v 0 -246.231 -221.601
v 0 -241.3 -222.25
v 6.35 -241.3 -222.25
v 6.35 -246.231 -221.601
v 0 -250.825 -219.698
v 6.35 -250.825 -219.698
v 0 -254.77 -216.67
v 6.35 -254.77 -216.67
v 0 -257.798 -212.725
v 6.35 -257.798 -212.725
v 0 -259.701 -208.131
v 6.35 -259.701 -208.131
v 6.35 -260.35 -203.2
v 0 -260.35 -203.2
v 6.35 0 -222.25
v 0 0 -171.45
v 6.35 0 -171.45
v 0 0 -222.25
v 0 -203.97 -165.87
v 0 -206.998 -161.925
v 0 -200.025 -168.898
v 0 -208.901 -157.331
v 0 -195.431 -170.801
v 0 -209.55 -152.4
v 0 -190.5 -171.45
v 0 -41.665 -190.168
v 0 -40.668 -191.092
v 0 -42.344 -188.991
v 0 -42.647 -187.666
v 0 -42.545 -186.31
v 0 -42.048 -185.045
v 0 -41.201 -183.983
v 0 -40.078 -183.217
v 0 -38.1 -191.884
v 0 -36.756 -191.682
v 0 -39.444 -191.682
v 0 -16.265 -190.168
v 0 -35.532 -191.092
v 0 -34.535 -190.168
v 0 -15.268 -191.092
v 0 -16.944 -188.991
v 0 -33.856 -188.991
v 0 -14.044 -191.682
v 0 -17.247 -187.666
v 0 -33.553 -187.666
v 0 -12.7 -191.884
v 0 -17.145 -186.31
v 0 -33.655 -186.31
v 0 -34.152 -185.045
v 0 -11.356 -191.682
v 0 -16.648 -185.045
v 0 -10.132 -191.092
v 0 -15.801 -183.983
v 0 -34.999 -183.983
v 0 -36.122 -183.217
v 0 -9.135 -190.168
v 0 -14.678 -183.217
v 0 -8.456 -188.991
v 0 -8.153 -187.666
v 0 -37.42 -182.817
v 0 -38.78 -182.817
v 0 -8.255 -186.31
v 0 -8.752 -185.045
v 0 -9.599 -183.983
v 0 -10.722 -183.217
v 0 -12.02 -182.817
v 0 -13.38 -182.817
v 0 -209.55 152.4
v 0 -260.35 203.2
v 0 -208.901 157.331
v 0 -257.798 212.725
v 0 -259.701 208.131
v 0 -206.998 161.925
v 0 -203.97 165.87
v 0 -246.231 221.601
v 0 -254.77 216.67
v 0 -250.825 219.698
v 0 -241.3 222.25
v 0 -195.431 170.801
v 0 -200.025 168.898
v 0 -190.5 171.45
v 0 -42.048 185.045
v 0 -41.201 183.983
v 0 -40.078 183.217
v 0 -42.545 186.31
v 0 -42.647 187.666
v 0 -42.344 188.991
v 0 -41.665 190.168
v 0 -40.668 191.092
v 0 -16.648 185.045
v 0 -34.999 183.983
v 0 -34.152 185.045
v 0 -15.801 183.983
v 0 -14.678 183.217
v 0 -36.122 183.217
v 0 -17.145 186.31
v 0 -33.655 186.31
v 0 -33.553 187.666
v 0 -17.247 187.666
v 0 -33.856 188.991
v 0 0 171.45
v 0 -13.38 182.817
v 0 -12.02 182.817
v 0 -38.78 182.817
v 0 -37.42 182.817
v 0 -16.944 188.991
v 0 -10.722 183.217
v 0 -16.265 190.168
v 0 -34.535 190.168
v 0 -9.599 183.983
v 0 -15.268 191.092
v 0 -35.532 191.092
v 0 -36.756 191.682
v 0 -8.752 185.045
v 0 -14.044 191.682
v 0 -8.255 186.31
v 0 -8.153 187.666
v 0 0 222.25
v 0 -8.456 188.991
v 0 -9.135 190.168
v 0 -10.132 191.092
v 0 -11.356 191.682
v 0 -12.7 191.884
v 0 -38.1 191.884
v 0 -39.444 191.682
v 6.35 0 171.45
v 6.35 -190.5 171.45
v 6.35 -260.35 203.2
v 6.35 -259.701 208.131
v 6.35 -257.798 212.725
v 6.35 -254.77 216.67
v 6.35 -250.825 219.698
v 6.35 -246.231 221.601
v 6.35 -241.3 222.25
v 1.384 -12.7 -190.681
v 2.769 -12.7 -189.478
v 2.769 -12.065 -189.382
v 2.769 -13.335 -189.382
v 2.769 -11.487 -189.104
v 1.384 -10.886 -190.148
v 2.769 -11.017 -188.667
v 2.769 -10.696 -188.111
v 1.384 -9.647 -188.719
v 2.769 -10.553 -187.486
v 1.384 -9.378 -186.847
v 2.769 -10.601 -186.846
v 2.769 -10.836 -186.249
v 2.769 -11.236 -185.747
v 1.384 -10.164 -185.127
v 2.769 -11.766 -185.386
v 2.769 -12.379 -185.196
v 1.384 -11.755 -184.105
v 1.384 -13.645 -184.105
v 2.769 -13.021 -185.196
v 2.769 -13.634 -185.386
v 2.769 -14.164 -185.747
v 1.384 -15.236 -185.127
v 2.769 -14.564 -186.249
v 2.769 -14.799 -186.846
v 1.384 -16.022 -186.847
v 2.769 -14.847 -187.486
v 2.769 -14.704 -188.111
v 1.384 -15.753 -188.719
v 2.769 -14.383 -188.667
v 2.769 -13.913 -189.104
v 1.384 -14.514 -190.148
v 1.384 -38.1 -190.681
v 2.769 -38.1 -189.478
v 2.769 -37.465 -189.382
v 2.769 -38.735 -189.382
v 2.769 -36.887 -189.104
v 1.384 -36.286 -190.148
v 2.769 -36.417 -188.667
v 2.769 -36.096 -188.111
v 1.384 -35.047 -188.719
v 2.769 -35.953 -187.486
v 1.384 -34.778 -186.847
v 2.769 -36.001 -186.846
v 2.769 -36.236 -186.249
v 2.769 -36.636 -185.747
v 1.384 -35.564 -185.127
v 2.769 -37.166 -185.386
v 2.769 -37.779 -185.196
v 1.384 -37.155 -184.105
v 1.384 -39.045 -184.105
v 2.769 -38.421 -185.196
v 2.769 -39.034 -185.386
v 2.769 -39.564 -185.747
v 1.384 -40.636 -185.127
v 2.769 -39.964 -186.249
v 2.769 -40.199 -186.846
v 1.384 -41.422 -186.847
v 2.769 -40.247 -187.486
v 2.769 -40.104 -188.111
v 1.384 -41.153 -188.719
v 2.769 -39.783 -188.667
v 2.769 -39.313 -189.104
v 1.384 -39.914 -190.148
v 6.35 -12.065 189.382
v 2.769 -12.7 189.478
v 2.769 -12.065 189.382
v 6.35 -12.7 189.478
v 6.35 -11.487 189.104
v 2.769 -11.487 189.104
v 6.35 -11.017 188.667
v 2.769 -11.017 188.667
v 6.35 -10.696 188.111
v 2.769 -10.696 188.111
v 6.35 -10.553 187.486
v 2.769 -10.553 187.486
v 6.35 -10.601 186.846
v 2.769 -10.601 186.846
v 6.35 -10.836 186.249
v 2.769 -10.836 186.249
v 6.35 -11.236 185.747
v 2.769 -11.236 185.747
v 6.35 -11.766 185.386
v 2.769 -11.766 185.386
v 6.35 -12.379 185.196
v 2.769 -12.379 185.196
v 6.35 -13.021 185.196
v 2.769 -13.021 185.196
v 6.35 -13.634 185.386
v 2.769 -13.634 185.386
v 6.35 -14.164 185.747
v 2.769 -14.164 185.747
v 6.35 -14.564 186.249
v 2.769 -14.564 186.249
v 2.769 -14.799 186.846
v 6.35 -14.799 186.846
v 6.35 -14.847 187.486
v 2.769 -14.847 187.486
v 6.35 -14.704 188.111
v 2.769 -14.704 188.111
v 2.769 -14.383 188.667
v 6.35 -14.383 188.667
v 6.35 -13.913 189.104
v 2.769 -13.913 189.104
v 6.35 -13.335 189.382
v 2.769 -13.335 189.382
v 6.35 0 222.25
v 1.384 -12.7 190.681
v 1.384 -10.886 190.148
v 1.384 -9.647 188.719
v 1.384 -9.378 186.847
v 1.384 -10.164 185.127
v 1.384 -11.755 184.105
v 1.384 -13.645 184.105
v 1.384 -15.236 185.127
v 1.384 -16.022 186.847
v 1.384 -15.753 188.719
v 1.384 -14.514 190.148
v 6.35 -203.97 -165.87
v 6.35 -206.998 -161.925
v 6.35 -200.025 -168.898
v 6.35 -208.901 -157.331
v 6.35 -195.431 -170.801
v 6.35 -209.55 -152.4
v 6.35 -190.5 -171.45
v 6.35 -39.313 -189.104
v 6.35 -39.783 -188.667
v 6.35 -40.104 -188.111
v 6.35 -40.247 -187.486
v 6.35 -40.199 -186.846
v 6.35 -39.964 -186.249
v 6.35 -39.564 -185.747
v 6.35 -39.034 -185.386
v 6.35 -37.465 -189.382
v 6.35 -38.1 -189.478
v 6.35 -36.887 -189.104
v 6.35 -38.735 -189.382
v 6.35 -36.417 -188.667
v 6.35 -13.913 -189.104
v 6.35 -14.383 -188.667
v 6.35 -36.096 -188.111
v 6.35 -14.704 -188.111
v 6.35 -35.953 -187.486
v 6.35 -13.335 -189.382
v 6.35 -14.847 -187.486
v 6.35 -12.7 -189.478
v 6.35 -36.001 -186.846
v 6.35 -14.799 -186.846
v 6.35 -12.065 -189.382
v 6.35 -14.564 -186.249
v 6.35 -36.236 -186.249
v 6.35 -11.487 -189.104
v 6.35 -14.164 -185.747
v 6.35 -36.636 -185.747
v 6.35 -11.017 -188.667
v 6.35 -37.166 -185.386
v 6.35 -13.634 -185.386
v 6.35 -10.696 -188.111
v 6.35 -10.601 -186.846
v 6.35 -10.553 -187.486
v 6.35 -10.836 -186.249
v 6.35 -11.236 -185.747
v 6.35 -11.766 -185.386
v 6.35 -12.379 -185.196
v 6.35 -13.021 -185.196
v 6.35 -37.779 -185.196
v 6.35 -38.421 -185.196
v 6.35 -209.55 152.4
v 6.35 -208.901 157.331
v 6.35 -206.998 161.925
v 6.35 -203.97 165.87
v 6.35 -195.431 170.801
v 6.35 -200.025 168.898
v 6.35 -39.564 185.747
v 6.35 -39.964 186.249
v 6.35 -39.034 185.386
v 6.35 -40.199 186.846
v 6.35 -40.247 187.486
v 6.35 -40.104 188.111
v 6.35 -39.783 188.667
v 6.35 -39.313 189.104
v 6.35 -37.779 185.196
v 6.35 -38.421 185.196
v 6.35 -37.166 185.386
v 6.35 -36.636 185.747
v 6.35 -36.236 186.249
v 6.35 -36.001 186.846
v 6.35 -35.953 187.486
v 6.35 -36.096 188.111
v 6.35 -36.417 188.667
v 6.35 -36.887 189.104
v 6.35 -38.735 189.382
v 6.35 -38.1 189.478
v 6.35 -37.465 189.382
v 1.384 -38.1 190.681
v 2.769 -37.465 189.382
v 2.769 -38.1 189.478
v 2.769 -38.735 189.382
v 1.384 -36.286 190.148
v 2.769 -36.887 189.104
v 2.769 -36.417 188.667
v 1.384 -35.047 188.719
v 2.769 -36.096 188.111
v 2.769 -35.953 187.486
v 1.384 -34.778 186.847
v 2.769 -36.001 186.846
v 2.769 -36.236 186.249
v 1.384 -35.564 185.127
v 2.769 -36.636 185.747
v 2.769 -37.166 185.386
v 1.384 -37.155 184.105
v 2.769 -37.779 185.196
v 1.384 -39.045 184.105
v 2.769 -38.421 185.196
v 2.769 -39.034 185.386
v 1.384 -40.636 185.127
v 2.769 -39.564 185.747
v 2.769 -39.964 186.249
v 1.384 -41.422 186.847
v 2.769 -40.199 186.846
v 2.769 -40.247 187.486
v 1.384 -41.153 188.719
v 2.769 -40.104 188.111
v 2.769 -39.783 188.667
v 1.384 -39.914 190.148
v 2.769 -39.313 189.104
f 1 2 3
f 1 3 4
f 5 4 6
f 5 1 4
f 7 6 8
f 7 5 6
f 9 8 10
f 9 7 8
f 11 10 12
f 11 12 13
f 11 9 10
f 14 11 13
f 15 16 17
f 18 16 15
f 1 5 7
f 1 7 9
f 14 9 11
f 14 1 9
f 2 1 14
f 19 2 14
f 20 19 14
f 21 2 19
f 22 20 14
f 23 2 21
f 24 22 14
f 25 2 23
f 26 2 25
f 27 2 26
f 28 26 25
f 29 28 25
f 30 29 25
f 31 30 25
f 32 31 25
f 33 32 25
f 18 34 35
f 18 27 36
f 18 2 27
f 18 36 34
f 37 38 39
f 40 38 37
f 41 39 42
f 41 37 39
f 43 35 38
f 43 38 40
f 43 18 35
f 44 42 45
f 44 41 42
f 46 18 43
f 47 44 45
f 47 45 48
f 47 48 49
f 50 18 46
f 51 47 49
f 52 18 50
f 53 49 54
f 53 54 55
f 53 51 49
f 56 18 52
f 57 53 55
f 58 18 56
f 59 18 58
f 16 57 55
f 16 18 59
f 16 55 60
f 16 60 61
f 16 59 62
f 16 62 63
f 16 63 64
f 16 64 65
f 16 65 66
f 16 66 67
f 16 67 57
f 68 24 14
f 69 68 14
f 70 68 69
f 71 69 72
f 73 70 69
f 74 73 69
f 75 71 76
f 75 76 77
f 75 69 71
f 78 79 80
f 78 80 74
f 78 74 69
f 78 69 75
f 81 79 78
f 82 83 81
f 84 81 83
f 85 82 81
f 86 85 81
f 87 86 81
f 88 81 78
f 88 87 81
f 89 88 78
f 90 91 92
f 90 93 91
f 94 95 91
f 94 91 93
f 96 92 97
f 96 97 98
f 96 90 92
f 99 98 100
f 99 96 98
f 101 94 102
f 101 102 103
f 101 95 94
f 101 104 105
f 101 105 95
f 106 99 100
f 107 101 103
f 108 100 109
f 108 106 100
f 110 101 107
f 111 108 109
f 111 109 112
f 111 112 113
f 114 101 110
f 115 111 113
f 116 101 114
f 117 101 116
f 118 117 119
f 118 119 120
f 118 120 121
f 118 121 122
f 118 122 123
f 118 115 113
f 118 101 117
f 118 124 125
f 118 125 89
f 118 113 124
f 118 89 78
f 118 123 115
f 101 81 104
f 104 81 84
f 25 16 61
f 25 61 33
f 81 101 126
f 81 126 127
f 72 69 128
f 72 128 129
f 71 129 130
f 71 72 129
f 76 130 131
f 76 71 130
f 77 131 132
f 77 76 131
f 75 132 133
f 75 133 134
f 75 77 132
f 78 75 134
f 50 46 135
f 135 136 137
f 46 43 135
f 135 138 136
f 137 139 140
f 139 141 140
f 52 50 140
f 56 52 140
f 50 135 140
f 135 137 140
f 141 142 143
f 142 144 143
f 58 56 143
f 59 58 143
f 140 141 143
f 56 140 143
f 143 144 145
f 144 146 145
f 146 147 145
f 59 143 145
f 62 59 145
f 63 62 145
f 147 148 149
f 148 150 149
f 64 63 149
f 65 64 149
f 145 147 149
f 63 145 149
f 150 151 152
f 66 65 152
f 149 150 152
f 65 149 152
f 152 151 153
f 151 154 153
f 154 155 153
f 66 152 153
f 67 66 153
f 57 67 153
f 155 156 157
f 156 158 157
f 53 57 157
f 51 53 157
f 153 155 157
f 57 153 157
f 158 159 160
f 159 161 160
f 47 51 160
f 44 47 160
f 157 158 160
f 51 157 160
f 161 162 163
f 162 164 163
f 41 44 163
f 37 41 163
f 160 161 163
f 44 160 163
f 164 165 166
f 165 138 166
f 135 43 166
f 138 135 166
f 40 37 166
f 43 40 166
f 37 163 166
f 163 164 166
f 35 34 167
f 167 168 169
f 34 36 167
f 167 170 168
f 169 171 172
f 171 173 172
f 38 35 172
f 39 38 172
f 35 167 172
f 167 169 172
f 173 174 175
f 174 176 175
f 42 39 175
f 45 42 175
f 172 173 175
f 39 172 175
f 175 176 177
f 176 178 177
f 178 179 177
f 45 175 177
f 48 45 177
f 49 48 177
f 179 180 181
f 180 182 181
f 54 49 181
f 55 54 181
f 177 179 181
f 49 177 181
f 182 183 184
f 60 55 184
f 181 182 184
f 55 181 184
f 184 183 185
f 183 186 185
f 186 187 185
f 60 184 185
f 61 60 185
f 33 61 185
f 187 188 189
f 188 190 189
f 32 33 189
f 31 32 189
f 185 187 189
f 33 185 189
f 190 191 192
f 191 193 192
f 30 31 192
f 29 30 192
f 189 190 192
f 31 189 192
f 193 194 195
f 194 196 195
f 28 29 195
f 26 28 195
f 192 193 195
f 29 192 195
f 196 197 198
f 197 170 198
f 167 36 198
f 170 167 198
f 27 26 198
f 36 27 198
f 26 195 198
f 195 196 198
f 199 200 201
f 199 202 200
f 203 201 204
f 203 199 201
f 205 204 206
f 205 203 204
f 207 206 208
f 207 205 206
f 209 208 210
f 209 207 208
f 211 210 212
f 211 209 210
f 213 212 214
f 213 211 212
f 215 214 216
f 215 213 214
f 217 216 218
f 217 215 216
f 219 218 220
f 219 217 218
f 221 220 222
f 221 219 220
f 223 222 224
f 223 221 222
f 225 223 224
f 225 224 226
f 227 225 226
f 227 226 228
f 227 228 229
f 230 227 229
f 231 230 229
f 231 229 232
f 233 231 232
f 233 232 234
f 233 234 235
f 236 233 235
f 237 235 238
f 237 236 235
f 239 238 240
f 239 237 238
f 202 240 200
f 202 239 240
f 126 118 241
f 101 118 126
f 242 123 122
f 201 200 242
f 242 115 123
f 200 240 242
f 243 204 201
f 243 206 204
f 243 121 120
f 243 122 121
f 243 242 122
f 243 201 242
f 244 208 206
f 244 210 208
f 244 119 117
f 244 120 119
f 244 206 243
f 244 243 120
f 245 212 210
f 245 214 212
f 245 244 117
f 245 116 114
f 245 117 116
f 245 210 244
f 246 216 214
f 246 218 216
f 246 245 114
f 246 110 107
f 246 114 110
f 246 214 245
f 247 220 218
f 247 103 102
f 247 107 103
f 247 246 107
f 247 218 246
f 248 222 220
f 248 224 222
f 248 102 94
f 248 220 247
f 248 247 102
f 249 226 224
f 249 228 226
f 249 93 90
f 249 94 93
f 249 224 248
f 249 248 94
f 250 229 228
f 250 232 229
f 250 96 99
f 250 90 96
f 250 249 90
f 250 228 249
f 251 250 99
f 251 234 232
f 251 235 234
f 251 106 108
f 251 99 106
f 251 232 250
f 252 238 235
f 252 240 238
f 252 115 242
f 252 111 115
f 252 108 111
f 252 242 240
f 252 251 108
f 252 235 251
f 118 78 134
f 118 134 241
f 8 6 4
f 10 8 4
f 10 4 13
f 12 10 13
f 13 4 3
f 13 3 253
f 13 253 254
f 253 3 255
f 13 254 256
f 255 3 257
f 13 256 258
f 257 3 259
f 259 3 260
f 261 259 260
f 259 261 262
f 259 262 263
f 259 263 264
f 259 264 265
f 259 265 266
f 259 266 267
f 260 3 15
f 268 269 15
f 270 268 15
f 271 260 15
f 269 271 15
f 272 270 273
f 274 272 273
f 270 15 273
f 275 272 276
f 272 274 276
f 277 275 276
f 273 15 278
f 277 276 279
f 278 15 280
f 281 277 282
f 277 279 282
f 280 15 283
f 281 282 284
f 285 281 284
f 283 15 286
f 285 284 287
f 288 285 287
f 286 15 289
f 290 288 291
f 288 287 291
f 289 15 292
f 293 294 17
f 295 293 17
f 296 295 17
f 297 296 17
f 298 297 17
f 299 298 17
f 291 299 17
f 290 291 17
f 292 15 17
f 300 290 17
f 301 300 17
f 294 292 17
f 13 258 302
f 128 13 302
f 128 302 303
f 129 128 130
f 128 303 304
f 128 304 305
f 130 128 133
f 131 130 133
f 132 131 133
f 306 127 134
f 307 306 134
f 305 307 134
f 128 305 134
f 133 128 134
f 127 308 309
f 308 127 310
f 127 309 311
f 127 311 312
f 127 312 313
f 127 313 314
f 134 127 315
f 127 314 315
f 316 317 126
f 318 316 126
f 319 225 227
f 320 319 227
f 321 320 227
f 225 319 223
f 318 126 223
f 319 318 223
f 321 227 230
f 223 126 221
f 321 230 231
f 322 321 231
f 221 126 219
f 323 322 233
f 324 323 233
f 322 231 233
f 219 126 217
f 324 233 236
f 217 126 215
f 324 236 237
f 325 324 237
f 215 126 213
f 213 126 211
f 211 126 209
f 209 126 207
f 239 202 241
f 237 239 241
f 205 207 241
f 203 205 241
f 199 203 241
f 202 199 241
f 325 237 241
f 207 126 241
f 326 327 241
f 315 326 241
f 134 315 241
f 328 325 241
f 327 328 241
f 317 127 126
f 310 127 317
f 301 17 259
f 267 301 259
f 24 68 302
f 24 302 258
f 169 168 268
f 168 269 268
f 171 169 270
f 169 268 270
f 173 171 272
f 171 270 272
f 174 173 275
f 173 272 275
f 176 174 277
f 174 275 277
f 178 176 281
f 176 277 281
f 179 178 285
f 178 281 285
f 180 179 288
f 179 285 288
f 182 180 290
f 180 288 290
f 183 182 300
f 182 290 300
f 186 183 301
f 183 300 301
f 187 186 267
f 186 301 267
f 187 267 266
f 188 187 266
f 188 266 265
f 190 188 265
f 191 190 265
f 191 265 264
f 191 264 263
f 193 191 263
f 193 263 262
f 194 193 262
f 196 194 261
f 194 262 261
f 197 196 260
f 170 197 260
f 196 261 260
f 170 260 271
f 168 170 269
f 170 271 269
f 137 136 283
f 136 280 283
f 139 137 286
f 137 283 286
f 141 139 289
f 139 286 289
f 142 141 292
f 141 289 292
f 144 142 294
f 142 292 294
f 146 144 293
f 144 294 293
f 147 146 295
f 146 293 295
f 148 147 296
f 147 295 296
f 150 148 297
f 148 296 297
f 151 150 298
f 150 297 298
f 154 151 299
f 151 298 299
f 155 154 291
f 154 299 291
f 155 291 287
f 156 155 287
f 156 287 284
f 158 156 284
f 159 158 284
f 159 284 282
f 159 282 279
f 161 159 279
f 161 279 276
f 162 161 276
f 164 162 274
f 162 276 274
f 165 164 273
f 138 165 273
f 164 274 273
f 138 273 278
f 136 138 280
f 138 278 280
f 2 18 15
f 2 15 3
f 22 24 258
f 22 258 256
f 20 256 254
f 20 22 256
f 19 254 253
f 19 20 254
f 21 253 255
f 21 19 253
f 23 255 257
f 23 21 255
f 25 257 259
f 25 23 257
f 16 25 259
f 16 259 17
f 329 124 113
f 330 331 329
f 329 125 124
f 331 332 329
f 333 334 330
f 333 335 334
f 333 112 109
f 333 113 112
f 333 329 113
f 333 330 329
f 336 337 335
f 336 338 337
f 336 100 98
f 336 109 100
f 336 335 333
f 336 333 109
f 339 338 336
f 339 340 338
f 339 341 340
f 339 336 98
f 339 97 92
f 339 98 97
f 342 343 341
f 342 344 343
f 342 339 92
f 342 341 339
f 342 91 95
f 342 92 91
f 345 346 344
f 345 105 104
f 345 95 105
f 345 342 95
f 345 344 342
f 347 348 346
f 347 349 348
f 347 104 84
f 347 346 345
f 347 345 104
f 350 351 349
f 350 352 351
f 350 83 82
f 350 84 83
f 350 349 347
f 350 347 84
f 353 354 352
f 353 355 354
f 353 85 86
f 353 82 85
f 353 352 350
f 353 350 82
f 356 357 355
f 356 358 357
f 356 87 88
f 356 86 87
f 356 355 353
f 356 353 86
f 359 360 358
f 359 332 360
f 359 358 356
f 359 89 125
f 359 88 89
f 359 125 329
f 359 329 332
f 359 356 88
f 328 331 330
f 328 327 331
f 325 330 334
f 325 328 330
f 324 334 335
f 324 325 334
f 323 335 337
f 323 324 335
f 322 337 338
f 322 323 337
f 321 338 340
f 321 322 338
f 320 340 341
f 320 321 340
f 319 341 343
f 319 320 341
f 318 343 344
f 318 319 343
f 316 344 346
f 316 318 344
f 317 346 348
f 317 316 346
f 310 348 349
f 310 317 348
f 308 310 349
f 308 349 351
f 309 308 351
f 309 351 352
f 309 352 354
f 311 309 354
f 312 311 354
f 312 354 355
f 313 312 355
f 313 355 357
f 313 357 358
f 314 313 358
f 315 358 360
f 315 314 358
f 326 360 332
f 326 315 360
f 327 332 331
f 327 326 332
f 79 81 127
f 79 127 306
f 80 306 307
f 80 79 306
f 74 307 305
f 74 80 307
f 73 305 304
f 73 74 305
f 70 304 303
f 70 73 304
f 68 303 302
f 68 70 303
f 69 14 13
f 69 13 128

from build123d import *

# Parameters (mm, degrees)
BOSS_EXTRUDE2_DEPTH                               = 6.35
CSK_FOR_8_FLAT_HEAD_SOCKET_CAP_SCREW1_D           = 4.3053
CSK_FOR_8_FLAT_HEAD_SOCKET_CAP_SCREW1_CSINK_D     = 9.1186
CSK_FOR_8_FLAT_HEAD_SOCKET_CAP_SCREW1_CSINK_ANGLE = 82


with BuildPart() as part:
    # Sketch1 → Boss-Extrude2 (new body)
    with BuildSketch(Plane(origin=(0, 0, 0), x_dir=(0, 0, -1), z_dir=(1, 0, 0))):
        with BuildLine():
            Line((-222.25, 0), (-171.45, 0))
            Line((-171.45, 0), (-171.45, -190.5))
            ThreePointArc((-171.45, -190.5), (-165.870384182, -203.970384182), (-152.4, -209.55))
            Line((-152.4, -209.55), (152.4, -209.55))
            ThreePointArc((152.4, -209.55), (165.870384182, -203.970384182), (171.45, -190.5))
            Line((171.45, -190.5), (171.45, 0))
            Line((171.45, 0), (222.25, 0))
            Line((222.25, 0), (222.25, -241.3))
            ThreePointArc((222.25, -241.3), (216.670384182, -254.770384182), (203.2, -260.35))
            Line((203.2, -260.35), (-203.2, -260.35))
            ThreePointArc((-203.2, -260.35), (-216.670384182, -254.770384182), (-222.25, -241.3))
            Line((-222.25, -241.3), (-222.25, 0))
        make_face()
    extrude(amount=BOSS_EXTRUDE2_DEPTH)

    # CSK for #8 Flat Head Socket Cap Screw1 (through all)
    with Locations(Plane.ZY):
        with Locations((-187.325, -12.7), (-187.325, -38.1)):
            csk_for_8_flat_head_socket_cap_screw1 = CounterSinkHole(CSK_FOR_8_FLAT_HEAD_SOCKET_CAP_SCREW1_D / 2, CSK_FOR_8_FLAT_HEAD_SOCKET_CAP_SCREW1_CSINK_D / 2, counter_sink_angle=CSK_FOR_8_FLAT_HEAD_SOCKET_CAP_SCREW1_CSINK_ANGLE)

    # Mirror1: CSK for #8 Flat Head Socket Cap Screw1 across plane
    add(csk_for_8_flat_head_socket_cap_screw1.mirror(Plane.XY), mode=Mode.SUBTRACT)


solid = part.part
